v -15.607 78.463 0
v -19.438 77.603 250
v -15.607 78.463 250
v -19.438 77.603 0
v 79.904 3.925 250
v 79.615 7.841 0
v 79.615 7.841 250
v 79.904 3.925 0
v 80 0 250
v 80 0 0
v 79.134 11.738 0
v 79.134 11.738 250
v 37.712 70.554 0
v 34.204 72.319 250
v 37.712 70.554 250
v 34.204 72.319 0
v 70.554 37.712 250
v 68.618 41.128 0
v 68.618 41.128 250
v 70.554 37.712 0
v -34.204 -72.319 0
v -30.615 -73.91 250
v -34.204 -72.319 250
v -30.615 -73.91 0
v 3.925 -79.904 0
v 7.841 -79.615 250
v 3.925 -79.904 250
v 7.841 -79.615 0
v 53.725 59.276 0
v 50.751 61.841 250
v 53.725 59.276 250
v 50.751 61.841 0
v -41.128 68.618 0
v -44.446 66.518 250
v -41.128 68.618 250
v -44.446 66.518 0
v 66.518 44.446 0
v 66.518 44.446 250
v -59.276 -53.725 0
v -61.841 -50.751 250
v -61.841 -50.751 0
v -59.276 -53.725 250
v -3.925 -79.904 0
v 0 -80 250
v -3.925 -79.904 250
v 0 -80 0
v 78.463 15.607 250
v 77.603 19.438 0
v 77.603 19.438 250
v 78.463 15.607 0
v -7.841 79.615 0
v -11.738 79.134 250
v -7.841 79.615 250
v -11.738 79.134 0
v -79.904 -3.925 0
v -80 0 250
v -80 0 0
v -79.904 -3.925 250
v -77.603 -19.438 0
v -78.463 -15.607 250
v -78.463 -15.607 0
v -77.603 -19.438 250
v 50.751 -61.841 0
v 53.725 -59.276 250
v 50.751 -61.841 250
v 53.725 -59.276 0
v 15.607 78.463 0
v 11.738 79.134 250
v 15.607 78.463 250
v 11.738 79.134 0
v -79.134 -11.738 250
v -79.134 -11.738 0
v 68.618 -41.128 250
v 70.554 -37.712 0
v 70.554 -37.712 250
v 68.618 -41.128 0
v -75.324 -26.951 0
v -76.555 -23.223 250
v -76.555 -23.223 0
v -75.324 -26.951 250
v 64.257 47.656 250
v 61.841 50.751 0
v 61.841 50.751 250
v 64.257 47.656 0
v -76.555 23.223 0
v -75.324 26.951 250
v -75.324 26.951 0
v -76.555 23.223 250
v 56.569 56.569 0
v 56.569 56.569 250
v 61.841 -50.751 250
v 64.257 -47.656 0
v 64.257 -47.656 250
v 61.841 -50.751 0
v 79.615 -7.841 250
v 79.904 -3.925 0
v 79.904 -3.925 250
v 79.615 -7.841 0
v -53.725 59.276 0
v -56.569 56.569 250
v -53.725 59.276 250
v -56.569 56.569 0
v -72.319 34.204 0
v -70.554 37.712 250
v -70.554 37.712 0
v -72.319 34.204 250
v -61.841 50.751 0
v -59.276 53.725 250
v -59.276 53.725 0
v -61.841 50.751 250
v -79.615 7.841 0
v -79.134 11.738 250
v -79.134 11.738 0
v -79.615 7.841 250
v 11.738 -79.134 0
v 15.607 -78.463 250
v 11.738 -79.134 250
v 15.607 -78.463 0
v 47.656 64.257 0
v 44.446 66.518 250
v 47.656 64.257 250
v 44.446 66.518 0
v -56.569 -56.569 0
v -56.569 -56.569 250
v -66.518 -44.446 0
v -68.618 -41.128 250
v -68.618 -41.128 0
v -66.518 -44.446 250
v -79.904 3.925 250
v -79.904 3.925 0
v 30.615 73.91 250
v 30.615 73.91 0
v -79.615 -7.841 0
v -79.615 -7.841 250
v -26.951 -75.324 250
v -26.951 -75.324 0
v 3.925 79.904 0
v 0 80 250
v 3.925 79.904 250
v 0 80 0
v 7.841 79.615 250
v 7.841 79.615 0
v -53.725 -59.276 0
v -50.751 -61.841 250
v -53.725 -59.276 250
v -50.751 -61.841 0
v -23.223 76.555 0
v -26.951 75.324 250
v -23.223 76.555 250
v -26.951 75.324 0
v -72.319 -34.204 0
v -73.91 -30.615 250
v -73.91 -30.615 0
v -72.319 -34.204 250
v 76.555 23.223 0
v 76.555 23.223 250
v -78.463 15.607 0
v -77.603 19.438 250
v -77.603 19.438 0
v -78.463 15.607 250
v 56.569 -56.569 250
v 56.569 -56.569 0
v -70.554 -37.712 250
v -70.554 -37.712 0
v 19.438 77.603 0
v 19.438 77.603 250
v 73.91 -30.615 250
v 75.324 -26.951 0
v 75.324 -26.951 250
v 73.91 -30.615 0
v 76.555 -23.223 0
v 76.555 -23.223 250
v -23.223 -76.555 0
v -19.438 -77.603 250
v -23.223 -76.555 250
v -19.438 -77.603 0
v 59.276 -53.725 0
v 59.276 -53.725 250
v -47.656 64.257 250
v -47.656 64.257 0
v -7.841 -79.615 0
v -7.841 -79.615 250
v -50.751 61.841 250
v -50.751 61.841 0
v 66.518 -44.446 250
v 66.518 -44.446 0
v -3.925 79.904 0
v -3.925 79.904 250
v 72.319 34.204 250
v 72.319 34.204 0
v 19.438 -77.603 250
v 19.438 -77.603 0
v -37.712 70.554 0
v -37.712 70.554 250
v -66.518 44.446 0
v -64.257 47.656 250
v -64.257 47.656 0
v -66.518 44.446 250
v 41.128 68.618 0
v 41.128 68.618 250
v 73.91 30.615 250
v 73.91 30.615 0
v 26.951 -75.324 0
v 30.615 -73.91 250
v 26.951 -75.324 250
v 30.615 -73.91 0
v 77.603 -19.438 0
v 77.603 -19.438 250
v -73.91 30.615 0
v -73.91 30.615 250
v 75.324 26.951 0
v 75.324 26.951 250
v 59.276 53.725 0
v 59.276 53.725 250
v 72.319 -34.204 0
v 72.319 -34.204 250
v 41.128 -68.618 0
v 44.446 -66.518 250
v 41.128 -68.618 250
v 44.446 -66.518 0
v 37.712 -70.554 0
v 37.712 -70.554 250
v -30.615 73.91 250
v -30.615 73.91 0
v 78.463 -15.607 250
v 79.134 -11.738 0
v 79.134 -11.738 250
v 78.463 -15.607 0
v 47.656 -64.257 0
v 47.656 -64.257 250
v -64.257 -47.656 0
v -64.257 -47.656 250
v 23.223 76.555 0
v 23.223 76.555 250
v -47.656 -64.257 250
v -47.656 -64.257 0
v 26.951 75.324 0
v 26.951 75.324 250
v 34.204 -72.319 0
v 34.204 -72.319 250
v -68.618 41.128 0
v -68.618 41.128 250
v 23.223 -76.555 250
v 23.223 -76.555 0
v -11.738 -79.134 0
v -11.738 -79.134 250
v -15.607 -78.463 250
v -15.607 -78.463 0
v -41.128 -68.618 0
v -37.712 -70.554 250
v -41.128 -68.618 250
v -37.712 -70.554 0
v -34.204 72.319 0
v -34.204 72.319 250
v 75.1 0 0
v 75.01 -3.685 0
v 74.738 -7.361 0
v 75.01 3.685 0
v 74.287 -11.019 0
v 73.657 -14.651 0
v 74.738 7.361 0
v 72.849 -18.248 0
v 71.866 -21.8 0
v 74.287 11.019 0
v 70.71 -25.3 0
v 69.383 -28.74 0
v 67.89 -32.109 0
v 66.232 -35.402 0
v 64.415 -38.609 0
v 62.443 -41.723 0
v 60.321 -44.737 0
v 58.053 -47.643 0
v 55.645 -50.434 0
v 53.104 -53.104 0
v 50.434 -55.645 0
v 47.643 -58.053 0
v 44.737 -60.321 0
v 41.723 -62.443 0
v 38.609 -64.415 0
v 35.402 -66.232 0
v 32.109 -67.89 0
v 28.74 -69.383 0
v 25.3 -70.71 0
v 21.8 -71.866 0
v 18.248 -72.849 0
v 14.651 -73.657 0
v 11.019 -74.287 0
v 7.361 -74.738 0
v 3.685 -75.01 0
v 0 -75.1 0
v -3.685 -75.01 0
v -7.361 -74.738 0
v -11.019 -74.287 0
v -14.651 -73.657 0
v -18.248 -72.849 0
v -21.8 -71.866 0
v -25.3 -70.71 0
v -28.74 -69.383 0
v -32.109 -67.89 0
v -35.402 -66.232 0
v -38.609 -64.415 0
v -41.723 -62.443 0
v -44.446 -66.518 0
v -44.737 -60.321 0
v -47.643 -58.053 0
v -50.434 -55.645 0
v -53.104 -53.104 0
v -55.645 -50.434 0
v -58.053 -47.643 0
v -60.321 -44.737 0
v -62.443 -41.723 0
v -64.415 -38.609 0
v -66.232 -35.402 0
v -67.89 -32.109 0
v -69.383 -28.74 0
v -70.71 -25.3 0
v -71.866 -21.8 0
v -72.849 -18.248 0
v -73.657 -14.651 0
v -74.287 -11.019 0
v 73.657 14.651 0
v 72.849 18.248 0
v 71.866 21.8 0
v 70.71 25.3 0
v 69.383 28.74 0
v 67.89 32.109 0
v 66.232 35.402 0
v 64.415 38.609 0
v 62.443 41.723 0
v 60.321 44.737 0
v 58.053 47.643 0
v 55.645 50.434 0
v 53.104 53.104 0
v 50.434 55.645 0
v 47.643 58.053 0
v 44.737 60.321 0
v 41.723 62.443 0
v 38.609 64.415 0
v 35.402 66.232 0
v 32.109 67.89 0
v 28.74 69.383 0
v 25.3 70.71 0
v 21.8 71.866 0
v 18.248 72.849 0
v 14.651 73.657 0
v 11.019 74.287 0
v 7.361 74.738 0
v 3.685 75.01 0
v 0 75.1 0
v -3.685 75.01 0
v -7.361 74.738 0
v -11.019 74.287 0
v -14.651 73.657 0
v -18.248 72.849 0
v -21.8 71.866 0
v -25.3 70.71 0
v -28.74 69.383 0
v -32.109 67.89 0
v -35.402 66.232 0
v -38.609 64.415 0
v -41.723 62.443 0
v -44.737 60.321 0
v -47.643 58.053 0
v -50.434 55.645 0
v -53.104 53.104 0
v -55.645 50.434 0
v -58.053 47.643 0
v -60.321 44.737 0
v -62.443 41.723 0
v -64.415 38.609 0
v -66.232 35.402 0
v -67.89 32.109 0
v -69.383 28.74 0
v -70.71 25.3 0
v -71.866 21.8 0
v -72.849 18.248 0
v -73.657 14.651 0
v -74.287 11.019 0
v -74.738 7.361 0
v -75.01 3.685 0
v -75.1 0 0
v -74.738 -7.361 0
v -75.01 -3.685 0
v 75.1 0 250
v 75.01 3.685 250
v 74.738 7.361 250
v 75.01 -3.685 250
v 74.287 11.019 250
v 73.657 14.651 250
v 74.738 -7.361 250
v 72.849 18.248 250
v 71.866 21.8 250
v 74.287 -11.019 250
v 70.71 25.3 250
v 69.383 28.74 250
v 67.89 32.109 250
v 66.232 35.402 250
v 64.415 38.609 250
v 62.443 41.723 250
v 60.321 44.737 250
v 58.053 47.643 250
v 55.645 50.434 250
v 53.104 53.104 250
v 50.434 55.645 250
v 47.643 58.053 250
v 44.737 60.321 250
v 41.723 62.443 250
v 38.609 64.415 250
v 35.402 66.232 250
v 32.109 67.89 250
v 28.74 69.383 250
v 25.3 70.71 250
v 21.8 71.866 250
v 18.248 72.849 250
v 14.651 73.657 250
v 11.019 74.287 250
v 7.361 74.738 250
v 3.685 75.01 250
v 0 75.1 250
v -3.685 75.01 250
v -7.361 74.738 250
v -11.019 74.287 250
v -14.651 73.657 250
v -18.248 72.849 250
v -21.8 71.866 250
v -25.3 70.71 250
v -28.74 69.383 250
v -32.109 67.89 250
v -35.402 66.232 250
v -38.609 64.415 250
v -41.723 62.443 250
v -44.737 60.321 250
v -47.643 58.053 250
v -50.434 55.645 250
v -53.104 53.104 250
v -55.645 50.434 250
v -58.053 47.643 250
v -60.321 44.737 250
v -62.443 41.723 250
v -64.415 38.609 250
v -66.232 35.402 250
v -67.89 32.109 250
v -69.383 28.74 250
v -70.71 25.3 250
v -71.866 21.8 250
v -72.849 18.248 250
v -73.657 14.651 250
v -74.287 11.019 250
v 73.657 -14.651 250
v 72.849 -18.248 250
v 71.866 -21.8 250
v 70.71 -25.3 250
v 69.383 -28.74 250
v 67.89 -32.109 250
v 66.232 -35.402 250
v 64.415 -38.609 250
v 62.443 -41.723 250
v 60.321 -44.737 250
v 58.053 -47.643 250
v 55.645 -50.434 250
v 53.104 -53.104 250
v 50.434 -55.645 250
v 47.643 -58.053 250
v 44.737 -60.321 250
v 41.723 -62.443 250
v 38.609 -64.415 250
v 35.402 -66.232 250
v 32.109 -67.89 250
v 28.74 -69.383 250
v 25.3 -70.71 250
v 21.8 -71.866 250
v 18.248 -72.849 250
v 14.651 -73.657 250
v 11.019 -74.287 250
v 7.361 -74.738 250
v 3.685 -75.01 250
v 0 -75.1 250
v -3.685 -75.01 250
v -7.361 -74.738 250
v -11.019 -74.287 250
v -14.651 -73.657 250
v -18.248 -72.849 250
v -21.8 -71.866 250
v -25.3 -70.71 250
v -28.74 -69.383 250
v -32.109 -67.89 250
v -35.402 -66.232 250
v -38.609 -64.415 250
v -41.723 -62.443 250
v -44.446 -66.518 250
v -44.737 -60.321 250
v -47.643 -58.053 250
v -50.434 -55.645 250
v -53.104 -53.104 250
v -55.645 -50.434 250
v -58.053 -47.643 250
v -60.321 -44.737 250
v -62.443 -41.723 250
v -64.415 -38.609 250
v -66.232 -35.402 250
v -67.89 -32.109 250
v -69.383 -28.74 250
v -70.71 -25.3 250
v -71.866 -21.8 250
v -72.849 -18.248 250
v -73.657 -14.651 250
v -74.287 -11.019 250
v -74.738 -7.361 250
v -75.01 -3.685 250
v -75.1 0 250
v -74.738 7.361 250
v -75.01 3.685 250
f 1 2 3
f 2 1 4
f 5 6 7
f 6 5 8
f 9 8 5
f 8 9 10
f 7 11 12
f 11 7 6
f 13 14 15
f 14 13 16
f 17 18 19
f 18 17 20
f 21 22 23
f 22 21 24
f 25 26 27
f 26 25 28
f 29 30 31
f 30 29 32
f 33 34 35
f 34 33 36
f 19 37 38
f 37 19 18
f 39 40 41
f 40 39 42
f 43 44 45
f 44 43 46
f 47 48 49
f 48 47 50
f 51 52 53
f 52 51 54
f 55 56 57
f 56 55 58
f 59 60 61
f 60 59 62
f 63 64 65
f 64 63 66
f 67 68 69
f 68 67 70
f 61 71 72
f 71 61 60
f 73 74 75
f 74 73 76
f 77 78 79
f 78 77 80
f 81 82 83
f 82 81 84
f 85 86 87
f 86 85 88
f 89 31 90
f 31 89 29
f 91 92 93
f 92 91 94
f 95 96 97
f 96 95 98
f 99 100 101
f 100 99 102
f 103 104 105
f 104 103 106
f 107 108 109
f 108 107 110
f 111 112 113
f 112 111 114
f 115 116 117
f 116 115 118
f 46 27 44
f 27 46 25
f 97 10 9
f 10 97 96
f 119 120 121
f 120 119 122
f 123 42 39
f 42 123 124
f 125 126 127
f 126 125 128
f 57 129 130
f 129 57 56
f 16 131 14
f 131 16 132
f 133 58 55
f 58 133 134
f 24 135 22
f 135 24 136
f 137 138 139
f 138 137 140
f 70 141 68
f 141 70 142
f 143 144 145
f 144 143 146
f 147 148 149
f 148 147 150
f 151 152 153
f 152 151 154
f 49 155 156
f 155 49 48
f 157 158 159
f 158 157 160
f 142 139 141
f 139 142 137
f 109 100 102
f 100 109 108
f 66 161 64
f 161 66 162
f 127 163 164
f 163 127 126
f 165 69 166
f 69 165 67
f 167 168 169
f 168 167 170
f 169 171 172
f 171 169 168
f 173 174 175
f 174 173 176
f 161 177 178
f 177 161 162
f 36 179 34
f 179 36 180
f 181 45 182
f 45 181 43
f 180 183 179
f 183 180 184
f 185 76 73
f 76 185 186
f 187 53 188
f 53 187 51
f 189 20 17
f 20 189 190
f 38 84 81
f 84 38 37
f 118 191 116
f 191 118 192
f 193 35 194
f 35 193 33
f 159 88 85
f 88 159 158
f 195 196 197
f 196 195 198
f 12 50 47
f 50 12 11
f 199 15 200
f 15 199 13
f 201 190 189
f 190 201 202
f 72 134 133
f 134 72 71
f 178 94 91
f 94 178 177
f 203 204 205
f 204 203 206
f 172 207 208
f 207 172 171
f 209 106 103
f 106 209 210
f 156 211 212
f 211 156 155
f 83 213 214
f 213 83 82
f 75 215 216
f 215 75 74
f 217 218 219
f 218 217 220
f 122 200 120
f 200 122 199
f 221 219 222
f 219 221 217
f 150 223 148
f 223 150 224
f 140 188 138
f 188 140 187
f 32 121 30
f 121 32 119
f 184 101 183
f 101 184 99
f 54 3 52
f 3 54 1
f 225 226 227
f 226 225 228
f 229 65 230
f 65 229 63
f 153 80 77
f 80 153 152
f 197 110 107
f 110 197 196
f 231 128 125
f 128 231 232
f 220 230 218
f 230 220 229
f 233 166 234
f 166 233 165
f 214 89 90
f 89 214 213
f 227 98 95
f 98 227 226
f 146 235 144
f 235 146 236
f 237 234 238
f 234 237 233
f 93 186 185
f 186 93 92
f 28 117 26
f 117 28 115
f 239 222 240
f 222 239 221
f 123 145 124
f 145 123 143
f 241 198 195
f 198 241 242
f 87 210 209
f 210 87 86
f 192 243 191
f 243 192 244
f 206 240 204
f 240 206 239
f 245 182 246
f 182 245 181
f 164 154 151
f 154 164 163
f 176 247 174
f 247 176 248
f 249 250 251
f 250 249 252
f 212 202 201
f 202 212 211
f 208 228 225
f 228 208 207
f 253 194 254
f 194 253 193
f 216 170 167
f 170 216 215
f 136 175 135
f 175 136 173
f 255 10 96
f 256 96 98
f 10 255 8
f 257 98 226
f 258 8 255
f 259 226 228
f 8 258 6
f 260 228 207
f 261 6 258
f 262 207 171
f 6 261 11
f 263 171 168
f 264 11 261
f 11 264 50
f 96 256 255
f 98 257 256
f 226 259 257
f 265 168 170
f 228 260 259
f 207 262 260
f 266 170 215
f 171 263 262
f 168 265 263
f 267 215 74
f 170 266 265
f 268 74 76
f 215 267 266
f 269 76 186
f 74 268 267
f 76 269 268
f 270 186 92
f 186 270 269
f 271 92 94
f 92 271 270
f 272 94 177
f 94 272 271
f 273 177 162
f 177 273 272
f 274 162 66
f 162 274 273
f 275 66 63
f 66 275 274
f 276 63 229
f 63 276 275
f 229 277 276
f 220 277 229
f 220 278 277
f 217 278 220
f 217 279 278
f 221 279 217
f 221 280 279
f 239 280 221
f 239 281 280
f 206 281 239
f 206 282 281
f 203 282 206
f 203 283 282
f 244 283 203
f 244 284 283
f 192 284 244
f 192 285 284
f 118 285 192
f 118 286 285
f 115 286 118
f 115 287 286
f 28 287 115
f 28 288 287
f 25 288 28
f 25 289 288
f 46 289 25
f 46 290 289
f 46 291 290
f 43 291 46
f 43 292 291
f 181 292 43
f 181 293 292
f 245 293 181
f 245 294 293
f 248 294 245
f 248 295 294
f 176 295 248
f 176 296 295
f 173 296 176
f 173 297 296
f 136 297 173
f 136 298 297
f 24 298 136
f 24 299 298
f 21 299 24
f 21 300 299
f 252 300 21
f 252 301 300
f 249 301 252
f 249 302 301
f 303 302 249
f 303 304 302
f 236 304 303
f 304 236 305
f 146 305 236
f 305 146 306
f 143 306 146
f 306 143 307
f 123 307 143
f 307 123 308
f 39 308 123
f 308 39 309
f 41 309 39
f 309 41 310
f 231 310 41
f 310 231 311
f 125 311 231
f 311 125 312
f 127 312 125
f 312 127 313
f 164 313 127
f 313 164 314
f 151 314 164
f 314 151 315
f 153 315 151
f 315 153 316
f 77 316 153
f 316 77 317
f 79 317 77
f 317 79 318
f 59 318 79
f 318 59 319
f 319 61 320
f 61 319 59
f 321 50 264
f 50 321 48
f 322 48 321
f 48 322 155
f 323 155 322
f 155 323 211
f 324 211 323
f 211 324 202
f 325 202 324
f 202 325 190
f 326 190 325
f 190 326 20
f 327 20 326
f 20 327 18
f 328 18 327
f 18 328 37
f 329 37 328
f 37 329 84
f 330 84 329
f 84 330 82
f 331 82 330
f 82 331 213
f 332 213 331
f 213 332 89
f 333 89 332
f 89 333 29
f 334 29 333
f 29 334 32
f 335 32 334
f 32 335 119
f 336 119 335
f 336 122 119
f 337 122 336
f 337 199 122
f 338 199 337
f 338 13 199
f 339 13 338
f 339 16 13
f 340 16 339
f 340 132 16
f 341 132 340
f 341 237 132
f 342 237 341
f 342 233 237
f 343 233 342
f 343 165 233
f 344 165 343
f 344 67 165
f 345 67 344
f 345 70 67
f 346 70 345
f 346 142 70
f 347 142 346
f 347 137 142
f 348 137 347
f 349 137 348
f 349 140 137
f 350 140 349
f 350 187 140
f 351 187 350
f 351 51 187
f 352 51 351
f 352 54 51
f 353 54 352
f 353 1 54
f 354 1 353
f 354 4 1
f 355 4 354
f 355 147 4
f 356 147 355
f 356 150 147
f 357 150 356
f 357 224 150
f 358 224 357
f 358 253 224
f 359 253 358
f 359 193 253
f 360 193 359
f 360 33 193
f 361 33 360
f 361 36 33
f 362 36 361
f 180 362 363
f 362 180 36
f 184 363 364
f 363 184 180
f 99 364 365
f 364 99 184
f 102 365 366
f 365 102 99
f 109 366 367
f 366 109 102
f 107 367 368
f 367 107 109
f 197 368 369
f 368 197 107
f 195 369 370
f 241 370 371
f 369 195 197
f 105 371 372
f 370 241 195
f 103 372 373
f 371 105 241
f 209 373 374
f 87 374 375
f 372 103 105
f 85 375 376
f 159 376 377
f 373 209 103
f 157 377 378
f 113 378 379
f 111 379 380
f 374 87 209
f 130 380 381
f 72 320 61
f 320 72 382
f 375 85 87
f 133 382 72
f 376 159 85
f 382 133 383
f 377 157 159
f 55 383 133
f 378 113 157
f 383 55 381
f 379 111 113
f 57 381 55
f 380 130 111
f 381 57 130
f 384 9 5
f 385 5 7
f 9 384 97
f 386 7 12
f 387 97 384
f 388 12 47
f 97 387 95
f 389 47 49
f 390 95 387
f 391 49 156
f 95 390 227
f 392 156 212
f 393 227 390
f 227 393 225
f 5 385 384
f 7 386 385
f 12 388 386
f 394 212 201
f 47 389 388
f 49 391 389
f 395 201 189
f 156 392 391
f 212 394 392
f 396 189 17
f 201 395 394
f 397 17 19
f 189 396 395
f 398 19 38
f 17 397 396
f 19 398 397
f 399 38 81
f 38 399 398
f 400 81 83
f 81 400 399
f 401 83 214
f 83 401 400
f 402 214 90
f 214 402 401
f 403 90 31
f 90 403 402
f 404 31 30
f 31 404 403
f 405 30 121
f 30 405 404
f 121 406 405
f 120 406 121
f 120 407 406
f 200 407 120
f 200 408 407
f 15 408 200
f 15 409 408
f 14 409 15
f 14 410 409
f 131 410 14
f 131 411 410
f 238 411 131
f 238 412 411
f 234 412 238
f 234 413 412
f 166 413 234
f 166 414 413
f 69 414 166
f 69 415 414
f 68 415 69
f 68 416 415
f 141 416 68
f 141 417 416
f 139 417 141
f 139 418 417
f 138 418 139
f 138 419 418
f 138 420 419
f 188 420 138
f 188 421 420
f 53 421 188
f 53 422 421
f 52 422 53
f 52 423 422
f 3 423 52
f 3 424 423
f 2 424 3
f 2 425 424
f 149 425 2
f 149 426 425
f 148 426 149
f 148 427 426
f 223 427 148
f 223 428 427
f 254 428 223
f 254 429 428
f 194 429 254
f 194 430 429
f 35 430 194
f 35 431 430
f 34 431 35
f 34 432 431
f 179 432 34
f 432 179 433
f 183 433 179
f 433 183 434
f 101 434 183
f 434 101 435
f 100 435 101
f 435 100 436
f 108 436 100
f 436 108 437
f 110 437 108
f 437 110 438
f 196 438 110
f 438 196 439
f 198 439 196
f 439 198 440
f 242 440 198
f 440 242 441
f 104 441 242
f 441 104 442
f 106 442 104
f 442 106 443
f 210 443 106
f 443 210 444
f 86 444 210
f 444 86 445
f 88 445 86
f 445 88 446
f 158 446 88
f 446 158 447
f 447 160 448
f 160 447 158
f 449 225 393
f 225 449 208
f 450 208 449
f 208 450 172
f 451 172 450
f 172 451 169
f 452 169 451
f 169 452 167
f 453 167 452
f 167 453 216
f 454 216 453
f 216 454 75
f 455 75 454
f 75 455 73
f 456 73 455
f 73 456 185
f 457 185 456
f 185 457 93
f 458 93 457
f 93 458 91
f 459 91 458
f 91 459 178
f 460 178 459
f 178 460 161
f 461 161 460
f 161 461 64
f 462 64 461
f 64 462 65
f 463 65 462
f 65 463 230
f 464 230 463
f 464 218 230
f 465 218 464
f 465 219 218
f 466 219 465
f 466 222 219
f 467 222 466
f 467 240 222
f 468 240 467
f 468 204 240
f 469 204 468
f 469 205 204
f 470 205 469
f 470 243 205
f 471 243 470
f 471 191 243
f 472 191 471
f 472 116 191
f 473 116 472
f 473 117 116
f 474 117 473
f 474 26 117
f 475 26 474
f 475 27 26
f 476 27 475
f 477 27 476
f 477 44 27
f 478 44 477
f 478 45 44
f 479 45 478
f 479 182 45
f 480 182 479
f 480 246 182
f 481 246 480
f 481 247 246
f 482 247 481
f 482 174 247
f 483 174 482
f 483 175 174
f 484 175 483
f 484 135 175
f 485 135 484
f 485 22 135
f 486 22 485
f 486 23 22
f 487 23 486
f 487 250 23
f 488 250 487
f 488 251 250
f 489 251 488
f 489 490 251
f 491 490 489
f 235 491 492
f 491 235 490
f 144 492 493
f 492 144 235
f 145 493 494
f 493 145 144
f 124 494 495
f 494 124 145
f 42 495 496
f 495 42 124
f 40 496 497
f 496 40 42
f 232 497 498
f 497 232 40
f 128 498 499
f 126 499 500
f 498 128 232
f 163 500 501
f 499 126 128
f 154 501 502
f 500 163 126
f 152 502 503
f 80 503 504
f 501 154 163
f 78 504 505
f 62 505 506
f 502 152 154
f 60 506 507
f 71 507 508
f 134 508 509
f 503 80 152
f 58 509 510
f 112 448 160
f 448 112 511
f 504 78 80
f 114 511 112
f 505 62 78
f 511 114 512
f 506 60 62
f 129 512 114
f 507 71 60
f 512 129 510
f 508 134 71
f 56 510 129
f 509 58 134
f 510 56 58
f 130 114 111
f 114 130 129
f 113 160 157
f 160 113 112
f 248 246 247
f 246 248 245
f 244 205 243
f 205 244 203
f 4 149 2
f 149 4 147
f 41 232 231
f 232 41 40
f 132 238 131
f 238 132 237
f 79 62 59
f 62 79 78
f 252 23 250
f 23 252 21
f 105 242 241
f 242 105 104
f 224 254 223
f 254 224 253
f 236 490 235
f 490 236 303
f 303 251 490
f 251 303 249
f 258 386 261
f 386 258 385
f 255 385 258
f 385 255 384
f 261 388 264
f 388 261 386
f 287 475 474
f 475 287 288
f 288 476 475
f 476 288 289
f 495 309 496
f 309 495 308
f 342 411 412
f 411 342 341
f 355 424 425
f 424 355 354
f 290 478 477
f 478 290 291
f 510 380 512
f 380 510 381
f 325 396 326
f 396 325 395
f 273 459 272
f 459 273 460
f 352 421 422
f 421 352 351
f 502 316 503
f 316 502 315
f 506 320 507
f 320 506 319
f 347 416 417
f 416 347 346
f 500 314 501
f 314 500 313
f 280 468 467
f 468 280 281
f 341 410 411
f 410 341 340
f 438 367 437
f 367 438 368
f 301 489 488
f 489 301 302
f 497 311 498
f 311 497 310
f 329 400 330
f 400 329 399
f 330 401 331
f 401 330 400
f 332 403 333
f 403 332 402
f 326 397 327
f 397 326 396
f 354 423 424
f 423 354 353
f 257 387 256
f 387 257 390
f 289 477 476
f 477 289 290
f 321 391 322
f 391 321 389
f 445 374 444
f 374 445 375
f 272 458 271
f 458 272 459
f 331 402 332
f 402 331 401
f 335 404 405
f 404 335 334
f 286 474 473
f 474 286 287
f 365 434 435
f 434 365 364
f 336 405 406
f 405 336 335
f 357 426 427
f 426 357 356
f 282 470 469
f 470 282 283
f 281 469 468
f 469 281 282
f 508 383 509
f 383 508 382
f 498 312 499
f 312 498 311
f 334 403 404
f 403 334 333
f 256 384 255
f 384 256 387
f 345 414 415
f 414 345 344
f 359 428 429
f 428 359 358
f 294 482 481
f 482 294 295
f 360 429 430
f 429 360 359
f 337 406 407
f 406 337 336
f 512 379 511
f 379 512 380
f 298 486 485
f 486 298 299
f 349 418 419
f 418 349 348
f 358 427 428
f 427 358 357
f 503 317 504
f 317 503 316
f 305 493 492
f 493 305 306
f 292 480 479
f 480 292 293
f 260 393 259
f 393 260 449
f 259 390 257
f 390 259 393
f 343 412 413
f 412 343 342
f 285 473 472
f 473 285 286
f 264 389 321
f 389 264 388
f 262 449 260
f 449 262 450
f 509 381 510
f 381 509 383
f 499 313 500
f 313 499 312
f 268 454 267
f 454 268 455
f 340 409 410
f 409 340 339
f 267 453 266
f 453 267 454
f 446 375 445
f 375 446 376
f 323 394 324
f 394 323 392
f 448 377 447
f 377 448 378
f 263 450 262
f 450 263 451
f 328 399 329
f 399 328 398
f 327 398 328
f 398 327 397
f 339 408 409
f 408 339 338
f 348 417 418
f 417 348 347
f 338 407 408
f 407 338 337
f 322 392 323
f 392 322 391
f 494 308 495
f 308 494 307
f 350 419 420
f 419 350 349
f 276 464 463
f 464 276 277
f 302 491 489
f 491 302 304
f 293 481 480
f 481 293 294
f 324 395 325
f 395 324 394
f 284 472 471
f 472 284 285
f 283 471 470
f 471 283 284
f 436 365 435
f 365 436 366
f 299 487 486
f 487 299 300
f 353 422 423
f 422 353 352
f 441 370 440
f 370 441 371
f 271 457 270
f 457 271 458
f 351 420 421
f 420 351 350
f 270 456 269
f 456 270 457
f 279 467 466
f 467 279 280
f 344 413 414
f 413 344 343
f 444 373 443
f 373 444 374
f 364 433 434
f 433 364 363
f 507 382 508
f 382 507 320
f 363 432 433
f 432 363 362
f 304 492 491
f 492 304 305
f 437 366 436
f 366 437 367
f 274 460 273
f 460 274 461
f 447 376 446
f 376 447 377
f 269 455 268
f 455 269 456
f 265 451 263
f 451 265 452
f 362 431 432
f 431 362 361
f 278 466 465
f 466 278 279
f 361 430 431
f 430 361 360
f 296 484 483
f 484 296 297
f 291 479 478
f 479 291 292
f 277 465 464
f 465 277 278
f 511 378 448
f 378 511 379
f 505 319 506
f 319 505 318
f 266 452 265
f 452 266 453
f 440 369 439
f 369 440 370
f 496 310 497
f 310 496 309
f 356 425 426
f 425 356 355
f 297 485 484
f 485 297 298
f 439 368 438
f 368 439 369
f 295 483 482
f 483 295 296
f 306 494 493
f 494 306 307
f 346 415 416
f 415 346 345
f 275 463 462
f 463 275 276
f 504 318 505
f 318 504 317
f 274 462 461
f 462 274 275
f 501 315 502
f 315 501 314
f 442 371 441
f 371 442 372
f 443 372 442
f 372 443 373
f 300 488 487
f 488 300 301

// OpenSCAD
$fn = 128;

// HT pipe parameters (approximation)
od = 160;          // outer diameter in mm
length = 250;      // length in mm
wall = 4.9;        // typical wall thickness for DN160 HT pipe (approx.)
id = od - 2*wall;  // inner diameter

difference() {
    cylinder(h = length, d = od);
    translate([0,0,-0.5])
        cylinder(h = length + 1, d = id);
}
